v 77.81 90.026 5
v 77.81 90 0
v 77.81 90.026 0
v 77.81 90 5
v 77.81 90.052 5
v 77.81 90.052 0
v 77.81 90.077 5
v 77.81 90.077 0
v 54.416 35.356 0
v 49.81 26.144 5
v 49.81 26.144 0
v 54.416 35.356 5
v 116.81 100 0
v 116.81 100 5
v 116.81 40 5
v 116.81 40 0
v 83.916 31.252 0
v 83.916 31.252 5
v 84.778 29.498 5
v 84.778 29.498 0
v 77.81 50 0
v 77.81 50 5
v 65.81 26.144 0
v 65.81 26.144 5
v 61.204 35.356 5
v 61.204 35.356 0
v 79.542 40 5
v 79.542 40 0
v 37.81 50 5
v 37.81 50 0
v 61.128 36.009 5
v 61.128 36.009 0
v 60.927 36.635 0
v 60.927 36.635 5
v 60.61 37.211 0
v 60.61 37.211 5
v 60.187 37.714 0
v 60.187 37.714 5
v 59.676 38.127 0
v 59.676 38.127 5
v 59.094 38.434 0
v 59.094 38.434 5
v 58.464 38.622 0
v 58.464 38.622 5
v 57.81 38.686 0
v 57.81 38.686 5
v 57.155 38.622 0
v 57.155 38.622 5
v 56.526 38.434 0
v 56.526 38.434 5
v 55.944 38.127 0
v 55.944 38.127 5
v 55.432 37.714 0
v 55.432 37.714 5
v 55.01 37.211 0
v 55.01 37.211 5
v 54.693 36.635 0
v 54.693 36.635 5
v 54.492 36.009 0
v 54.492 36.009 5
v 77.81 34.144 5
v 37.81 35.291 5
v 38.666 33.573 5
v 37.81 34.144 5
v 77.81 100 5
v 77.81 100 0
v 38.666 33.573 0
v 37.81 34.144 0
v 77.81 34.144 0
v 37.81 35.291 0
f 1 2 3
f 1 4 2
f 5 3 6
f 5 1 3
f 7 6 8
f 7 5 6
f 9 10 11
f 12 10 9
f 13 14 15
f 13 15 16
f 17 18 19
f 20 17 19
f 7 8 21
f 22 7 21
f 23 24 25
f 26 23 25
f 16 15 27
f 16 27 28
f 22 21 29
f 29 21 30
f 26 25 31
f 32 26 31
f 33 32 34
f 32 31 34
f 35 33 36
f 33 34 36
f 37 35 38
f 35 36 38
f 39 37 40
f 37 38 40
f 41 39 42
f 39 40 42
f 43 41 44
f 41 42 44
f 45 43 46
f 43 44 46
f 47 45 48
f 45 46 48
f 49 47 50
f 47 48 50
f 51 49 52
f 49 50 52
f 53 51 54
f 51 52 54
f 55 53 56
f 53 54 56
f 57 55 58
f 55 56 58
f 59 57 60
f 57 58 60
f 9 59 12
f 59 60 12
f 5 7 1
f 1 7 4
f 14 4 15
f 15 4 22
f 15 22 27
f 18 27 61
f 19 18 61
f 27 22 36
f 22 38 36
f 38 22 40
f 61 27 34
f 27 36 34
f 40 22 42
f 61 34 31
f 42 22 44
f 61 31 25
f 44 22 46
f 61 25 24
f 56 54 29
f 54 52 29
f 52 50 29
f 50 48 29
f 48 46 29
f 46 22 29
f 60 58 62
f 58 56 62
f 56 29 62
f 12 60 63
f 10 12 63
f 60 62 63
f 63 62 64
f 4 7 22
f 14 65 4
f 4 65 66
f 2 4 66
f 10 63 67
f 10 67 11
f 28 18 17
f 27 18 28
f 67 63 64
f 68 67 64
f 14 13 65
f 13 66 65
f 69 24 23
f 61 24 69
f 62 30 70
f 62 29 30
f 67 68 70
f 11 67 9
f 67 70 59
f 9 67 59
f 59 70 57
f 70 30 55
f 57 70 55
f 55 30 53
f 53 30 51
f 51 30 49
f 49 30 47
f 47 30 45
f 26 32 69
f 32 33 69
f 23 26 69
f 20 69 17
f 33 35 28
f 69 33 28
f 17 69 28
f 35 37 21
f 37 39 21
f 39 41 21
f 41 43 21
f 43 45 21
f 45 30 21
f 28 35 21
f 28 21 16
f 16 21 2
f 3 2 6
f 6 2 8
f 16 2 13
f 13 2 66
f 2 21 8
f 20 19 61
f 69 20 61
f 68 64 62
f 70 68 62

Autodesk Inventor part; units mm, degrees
ref_plane "YZ Plane" through (0, 0, 0) normal (1, 0, 0) x (0, 1, 0)
ref_plane "XZ Plane" through (0, 0, 0) normal (0, 1, 0) x (-1, 0, 0)
ref_plane "XY Plane" through (0, 0, 0) normal (0, 0, 1) x (1, 0, 0)
sketch "Sketch2" plane through (0, 0, 0) normal (0, 0, 1) x (1, 0, 0)
  line L0 (0, 0) -> (100, 0)
  line L1 (100, 0) -> (100, 100)
  line L2 (100, 100) -> (0, 100)
  line L3 (0, 100) -> (0, 0)
  dimension "d24" = 100
  dimension "d25" = 100
extrude "Extrusion3" add sketch "Sketch2" along normal blind 5
sketch "Sketch3" plane through (0, 0, 5) normal (0, 0, 1) x (1, 0, 0)
  line L0 (100, 100) -> (0, 100) projected
  line L1 (61.1065, 16.5645) -> (65.8098, 9.5096)
  ellipse E0 centre (57.8098, 14.5814) end of major axis (53.8097, 14.5816) minor radius 3.4641
  line L2 (49.8098, 9.5096) -> (54.5131, 16.5645)
  line L3 (65.8098, 9.5096) -> (77.2764, 15.2429)
  line L4 (83.9156, 31.2525) -> (78.0026, 43.0784)
  line L5 (49.8098, 26.1436) -> (54.4159, 35.3558)
  line L6 (58.3112, 37.4887) -> (58.6416, 37.4249)
  line L7 (56.9769, 37.4324) -> (57.4131, 37.502)
  line L8 (38.6658, 33.573) -> (49.8098, 26.1436)
  ellipse E1 centre (30.5481, 100.1015) end of major axis (25.0287, 91.7624) minor radius 10.0002
  line L9 (78.4473, 33.7186) -> (83.2584, 30.5112)
  line L10 (83.2584, 30.5112) -> (84.5136, 29.6744)
  line L11 (83.9156, 31.2525) -> (84.7776, 29.4984)
  line L12 (83.9156, 31.2525) -> (85.87, 31.2525) construction
  line L13 (84.7776, 29.4984) -> (84.5136, 29.6744)
  line L14 (78.4473, 33.7186) -> (77.8098, 34.1436)
  line L15 (78.4473, 33.7186) -> (79.931, 33.7186) construction
  line L16 (77.2128, 33.7456) -> (77.8098, 34.1436)
  line L17 (77.2128, 33.7456) -> (77.9303, 33.7456) construction
  line L18 (57.8098, 14.5814) -> (57.8098, 100)
  arc A0 (47.8099, 100) -> (37.8097, 90) centre (47.8099, 89.9998) ccw
  line L19 (47.8099, 89.9998) -> (57.8098, 89.9998)
  line L20 (57.8098, 89.9998) -> (67.8098, 89.9998)
  line L21 (57.8098, 89.9998) -> (67.8098, 89.9998) construction
  arc A1 (77.81, 90) -> (67.8098, 100) centre (67.8098, 89.9998) ccw
  line L22 (47.8099, 100) -> (67.8098, 100)
  line L23 (78.0026, 43.0784) -> (77.81, 43.4636)
  line L24 (78.0026, 43.0784) -> (78.4334, 43.0784) construction
  line L25 (77.81, 43.4636) -> (77.81, 43.8508)
  line L26 (65.8098, 26.1436) -> (61.2037, 35.3558)
  line L27 (37.8097, 63.9104) -> (37.8098, 35.2913)
  line L28 (38.6658, 33.573) -> (37.8098, 34.1436)
  line L29 (38.6658, 33.573) -> (39.6945, 33.573) construction
  line L30 (37.8098, 34.1436) -> (37.8098, 35.2913)
  line L31 (37.8097, 63.9104) -> (37.8097, 90)
  arc A2 (61.2037, 35.3558) -> (54.4159, 35.3558) centre (57.8098, 35.2913) ccw
  line L32 (65.8098, 26.1436) -> (77.2128, 33.7456)
  line L33 (77.81, 43.8508) -> (77.81, 90)
  line L34 (100, 0) -> (100, 100) projected
  line L35 (0, 100) -> (100, 100)
  line L36 (100, 100) -> (100, 0)
  line L37 (100, 0) -> (0, 0)
  line L38 (0, 0) -> (0, 100)
  point P0 (78.3106, 15.3544)
  point P1 (77.7245, 15.3467)
  point P2 (77.3127, 15.2462)
  point P3 (60.1591, 36.6399)
  point P4 (55.4604, 36.6398)
  point P5 (91.0098, 173.4299)
  dimension "d31" = 296.17
  dimension "d32" = 213.69
  dimension "d33" = 326.31
  dimension "d34" = 10
  dimension "d35" = 0
  dimension "d36" = 243.43
  dimension "d37" = 213.69
extrude "Extrusion4" cut sketch "Sketch3" against normal blind 10 contours E0 | L34 L37 L38 L0 E1 A0 L31 L27 L30 L28 L8 L5 A2 L26 L32 L16 L14 L9 L10 L13 L11 L4 L23 L25 L33 A1 | A0 E1 L0 | E1 L0 picked at (31.1987, 94.7741)
ref_plane "Work Plane2" through (49.8098, 26.1436, 5) normal (0, -0.433, -0.9014) x (-1, 0, 0)
ref_plane "Work Plane1" through (100, 100, 0) normal (0, -0.433, -0.9014) x (-1, 0, 0)
sketch "Sketch4" plane through (49.8098, 26.1436, 5) normal (0, -0.433, -0.9014) x (-1, 0, 0)
  line L0 (-27.403, 9.0174) -> (-16, 2.1651) projected
  line L1 (-16, 2.1651) -> (-27.403, 9.0174)
  point P0 (49.8098, -21.4002)
sketch "Sketch5" plane through (77.81, 43.4636, 5) normal (1, 0, 0) x (0, 0, -1)
  line L0 (5, 46.5364) -> (5, 56.5364) projected
  line L1 (5, 56.5364) -> (0, 56.5364)
  line L2 (0, 56.5364) -> (0, -3.4636)
  line L3 (0, -3.4636) -> (5, -3.4636)
  line L4 (5, -3.4636) -> (5, 56.5364)
  point P0 (5, -43.4636)
  dimension "d41" = 5
  dimension "d42" = 60
extrude "Extrusion5" add sketch "Sketch5" along normal blind 39
sketch "Sketch6" plane through (0, 0, 0) normal (0, 0, -1) x (-1, 0, 0)
  line L0 (-37.8097, 100) -> (-77.8097, 100)
  line L1 (-77.8097, 100) -> (-77.8097, 50)
  line L2 (-77.8097, 50) -> (-37.8097, 50)
  line L3 (-37.8097, 50) -> (-37.8097, 100)
  point P0 (0, 0)
  dimension "d45" = 40
  dimension "d46" = 50
extrude "Extrusion6" cut sketch "Sketch6" against normal blind 5
properties part number "Arm_Base"
